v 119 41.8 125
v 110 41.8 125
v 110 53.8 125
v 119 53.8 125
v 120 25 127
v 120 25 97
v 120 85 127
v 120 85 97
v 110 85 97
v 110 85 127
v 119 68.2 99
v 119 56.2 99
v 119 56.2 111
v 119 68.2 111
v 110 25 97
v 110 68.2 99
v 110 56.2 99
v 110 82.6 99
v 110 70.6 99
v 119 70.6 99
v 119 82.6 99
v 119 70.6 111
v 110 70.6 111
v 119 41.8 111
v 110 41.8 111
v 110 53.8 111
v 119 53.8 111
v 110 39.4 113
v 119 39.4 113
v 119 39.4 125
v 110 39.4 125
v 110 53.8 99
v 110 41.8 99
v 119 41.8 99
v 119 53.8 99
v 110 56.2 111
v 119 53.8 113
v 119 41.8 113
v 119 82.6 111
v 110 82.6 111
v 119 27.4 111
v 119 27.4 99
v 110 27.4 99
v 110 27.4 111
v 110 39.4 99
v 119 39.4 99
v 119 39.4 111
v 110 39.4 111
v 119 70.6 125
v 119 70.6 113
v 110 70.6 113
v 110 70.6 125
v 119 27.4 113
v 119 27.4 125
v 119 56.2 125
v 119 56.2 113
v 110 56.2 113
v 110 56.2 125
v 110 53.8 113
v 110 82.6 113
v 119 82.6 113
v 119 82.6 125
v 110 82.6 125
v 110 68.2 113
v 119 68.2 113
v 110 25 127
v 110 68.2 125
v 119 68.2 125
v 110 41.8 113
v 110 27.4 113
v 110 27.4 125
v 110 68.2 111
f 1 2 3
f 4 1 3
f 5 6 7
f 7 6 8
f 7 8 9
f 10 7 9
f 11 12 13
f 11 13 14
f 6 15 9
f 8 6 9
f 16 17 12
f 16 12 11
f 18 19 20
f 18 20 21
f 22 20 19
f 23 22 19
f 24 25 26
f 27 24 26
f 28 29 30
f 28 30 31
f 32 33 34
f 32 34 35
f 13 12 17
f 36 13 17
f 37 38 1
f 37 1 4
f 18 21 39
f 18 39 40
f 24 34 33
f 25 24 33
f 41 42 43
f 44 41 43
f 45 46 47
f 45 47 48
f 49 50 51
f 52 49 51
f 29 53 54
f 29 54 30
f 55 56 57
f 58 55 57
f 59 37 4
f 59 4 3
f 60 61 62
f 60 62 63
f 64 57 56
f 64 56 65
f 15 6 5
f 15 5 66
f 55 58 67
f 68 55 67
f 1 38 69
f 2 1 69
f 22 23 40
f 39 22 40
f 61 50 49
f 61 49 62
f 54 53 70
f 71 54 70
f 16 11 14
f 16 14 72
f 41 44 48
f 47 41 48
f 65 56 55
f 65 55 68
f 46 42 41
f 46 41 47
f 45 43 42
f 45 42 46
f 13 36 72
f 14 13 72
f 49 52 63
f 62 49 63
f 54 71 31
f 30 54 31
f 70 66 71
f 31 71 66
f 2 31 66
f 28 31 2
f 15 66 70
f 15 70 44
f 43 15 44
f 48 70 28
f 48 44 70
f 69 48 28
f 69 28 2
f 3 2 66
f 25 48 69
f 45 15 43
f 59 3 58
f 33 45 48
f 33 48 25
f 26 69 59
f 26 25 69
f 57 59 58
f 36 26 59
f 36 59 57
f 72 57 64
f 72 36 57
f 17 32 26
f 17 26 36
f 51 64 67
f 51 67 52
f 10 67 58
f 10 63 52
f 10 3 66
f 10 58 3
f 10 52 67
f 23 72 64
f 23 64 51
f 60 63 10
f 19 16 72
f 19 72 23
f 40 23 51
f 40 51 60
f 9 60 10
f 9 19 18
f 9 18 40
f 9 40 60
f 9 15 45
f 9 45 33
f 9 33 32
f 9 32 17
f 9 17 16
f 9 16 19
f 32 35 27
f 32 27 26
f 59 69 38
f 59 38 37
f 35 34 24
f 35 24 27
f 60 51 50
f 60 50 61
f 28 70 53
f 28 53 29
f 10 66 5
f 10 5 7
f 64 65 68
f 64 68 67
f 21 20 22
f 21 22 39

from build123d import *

# Parameters (mm, degrees)
BOX015_W               = 12
BOX015_H               = 10
BOX015_DEPTH           = 12
ARRAY001_X_COUNT       = 4
ARRAY001_X_PITCH       = 14.4
ARRAY001_Z_COUNT       = 2
ARRAY001_Z_PITCH       = 14
BOX014_W               = 60
BOX014_H               = 10
BOX014_DEPTH           = 30
CUT002_PLACEMENT_ANGLE = 90


with BuildPart() as matriz_huecos_libreria_baja:
    # Box015 → Box015 (new body)
    with BuildSketch(Plane.XY):
        with Locations((6, 5)):
            Rectangle(BOX015_W, BOX015_H)
    extrude(amount=BOX015_DEPTH)

    # Array001 X: Matriz huecos libreria baja ×4


with BuildPart() as matriz_huecos_libreria_baja_1:
    add(matriz_huecos_libreria_baja.part)
    with Locations(*[(i * ARRAY001_X_PITCH, 0, 0) for i in range(1, ARRAY001_X_COUNT)]):
        add(matriz_huecos_libreria_baja.part)

    # Array001 Z: Matriz huecos libreria baja ×2


with BuildPart() as matriz_huecos_libreria_baja_2:
    add(matriz_huecos_libreria_baja_1.part)
    with Locations(*[(0, 0, i * ARRAY001_Z_PITCH) for i in range(1, ARRAY001_Z_COUNT)]):
        add(matriz_huecos_libreria_baja_1.part)


with BuildPart() as matriz_huecos_libreria_baja_3:
    # Array001 placement: moved
    add(matriz_huecos_libreria_baja_2.part.moved(Location((27.4, 91, 2))))


with BuildPart() as libreria_baja_dormitorio:
    # Box014 → Box014 (new body)
    with BuildSketch(Plane(origin=(25, 90, 0), x_dir=(1, 0, 0), z_dir=(0, 0, 1))):
        with Locations((30, 5)):
            Rectangle(BOX014_W, BOX014_H)
    extrude(amount=BOX014_DEPTH)

    # Cut002: cut Matriz huecos libreria baja
    add(matriz_huecos_libreria_baja_3.part, mode=Mode.SUBTRACT)


with BuildPart() as libreria_baja_dormitorio_1:
    # Cut002 placement: moved
    add(libreria_baja_dormitorio.part.moved(Location((210, 0, 97))).rotate(Axis((210, 0, 97), (0, 0, 1)), CUT002_PLACEMENT_ANGLE))


solid = libreria_baja_dormitorio_1.part
